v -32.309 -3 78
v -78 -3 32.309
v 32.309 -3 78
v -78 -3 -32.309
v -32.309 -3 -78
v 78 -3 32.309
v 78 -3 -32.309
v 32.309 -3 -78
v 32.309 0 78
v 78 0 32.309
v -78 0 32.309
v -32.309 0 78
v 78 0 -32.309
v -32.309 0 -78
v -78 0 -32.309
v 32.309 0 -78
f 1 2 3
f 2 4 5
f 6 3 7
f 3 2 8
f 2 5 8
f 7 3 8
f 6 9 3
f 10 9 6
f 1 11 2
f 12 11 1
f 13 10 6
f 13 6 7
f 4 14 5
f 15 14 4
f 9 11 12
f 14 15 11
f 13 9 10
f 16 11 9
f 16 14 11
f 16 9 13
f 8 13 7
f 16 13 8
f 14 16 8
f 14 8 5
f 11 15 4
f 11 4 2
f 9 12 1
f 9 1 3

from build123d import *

# Parameters (mm, degrees)
BOSS_EXTRUDE5_DEPTH = 3


with BuildPart() as part:
    # Sketch6 → Boss-Extrude5 (new body)
    with BuildSketch(Plane(origin=(0, 0, 0), x_dir=(1, 0, 0), z_dir=(0, 1, 0))):
        Polygon((78, 32.308657865), (32.308657865, 78), (-32.308657865, 78), (-78, 32.308657865), (-78, -32.308657865), (-32.308657865, -78), (32.308657865, -78), (78, -32.308657865), align=None)
    extrude(amount=-BOSS_EXTRUDE5_DEPTH)


solid = part.part
